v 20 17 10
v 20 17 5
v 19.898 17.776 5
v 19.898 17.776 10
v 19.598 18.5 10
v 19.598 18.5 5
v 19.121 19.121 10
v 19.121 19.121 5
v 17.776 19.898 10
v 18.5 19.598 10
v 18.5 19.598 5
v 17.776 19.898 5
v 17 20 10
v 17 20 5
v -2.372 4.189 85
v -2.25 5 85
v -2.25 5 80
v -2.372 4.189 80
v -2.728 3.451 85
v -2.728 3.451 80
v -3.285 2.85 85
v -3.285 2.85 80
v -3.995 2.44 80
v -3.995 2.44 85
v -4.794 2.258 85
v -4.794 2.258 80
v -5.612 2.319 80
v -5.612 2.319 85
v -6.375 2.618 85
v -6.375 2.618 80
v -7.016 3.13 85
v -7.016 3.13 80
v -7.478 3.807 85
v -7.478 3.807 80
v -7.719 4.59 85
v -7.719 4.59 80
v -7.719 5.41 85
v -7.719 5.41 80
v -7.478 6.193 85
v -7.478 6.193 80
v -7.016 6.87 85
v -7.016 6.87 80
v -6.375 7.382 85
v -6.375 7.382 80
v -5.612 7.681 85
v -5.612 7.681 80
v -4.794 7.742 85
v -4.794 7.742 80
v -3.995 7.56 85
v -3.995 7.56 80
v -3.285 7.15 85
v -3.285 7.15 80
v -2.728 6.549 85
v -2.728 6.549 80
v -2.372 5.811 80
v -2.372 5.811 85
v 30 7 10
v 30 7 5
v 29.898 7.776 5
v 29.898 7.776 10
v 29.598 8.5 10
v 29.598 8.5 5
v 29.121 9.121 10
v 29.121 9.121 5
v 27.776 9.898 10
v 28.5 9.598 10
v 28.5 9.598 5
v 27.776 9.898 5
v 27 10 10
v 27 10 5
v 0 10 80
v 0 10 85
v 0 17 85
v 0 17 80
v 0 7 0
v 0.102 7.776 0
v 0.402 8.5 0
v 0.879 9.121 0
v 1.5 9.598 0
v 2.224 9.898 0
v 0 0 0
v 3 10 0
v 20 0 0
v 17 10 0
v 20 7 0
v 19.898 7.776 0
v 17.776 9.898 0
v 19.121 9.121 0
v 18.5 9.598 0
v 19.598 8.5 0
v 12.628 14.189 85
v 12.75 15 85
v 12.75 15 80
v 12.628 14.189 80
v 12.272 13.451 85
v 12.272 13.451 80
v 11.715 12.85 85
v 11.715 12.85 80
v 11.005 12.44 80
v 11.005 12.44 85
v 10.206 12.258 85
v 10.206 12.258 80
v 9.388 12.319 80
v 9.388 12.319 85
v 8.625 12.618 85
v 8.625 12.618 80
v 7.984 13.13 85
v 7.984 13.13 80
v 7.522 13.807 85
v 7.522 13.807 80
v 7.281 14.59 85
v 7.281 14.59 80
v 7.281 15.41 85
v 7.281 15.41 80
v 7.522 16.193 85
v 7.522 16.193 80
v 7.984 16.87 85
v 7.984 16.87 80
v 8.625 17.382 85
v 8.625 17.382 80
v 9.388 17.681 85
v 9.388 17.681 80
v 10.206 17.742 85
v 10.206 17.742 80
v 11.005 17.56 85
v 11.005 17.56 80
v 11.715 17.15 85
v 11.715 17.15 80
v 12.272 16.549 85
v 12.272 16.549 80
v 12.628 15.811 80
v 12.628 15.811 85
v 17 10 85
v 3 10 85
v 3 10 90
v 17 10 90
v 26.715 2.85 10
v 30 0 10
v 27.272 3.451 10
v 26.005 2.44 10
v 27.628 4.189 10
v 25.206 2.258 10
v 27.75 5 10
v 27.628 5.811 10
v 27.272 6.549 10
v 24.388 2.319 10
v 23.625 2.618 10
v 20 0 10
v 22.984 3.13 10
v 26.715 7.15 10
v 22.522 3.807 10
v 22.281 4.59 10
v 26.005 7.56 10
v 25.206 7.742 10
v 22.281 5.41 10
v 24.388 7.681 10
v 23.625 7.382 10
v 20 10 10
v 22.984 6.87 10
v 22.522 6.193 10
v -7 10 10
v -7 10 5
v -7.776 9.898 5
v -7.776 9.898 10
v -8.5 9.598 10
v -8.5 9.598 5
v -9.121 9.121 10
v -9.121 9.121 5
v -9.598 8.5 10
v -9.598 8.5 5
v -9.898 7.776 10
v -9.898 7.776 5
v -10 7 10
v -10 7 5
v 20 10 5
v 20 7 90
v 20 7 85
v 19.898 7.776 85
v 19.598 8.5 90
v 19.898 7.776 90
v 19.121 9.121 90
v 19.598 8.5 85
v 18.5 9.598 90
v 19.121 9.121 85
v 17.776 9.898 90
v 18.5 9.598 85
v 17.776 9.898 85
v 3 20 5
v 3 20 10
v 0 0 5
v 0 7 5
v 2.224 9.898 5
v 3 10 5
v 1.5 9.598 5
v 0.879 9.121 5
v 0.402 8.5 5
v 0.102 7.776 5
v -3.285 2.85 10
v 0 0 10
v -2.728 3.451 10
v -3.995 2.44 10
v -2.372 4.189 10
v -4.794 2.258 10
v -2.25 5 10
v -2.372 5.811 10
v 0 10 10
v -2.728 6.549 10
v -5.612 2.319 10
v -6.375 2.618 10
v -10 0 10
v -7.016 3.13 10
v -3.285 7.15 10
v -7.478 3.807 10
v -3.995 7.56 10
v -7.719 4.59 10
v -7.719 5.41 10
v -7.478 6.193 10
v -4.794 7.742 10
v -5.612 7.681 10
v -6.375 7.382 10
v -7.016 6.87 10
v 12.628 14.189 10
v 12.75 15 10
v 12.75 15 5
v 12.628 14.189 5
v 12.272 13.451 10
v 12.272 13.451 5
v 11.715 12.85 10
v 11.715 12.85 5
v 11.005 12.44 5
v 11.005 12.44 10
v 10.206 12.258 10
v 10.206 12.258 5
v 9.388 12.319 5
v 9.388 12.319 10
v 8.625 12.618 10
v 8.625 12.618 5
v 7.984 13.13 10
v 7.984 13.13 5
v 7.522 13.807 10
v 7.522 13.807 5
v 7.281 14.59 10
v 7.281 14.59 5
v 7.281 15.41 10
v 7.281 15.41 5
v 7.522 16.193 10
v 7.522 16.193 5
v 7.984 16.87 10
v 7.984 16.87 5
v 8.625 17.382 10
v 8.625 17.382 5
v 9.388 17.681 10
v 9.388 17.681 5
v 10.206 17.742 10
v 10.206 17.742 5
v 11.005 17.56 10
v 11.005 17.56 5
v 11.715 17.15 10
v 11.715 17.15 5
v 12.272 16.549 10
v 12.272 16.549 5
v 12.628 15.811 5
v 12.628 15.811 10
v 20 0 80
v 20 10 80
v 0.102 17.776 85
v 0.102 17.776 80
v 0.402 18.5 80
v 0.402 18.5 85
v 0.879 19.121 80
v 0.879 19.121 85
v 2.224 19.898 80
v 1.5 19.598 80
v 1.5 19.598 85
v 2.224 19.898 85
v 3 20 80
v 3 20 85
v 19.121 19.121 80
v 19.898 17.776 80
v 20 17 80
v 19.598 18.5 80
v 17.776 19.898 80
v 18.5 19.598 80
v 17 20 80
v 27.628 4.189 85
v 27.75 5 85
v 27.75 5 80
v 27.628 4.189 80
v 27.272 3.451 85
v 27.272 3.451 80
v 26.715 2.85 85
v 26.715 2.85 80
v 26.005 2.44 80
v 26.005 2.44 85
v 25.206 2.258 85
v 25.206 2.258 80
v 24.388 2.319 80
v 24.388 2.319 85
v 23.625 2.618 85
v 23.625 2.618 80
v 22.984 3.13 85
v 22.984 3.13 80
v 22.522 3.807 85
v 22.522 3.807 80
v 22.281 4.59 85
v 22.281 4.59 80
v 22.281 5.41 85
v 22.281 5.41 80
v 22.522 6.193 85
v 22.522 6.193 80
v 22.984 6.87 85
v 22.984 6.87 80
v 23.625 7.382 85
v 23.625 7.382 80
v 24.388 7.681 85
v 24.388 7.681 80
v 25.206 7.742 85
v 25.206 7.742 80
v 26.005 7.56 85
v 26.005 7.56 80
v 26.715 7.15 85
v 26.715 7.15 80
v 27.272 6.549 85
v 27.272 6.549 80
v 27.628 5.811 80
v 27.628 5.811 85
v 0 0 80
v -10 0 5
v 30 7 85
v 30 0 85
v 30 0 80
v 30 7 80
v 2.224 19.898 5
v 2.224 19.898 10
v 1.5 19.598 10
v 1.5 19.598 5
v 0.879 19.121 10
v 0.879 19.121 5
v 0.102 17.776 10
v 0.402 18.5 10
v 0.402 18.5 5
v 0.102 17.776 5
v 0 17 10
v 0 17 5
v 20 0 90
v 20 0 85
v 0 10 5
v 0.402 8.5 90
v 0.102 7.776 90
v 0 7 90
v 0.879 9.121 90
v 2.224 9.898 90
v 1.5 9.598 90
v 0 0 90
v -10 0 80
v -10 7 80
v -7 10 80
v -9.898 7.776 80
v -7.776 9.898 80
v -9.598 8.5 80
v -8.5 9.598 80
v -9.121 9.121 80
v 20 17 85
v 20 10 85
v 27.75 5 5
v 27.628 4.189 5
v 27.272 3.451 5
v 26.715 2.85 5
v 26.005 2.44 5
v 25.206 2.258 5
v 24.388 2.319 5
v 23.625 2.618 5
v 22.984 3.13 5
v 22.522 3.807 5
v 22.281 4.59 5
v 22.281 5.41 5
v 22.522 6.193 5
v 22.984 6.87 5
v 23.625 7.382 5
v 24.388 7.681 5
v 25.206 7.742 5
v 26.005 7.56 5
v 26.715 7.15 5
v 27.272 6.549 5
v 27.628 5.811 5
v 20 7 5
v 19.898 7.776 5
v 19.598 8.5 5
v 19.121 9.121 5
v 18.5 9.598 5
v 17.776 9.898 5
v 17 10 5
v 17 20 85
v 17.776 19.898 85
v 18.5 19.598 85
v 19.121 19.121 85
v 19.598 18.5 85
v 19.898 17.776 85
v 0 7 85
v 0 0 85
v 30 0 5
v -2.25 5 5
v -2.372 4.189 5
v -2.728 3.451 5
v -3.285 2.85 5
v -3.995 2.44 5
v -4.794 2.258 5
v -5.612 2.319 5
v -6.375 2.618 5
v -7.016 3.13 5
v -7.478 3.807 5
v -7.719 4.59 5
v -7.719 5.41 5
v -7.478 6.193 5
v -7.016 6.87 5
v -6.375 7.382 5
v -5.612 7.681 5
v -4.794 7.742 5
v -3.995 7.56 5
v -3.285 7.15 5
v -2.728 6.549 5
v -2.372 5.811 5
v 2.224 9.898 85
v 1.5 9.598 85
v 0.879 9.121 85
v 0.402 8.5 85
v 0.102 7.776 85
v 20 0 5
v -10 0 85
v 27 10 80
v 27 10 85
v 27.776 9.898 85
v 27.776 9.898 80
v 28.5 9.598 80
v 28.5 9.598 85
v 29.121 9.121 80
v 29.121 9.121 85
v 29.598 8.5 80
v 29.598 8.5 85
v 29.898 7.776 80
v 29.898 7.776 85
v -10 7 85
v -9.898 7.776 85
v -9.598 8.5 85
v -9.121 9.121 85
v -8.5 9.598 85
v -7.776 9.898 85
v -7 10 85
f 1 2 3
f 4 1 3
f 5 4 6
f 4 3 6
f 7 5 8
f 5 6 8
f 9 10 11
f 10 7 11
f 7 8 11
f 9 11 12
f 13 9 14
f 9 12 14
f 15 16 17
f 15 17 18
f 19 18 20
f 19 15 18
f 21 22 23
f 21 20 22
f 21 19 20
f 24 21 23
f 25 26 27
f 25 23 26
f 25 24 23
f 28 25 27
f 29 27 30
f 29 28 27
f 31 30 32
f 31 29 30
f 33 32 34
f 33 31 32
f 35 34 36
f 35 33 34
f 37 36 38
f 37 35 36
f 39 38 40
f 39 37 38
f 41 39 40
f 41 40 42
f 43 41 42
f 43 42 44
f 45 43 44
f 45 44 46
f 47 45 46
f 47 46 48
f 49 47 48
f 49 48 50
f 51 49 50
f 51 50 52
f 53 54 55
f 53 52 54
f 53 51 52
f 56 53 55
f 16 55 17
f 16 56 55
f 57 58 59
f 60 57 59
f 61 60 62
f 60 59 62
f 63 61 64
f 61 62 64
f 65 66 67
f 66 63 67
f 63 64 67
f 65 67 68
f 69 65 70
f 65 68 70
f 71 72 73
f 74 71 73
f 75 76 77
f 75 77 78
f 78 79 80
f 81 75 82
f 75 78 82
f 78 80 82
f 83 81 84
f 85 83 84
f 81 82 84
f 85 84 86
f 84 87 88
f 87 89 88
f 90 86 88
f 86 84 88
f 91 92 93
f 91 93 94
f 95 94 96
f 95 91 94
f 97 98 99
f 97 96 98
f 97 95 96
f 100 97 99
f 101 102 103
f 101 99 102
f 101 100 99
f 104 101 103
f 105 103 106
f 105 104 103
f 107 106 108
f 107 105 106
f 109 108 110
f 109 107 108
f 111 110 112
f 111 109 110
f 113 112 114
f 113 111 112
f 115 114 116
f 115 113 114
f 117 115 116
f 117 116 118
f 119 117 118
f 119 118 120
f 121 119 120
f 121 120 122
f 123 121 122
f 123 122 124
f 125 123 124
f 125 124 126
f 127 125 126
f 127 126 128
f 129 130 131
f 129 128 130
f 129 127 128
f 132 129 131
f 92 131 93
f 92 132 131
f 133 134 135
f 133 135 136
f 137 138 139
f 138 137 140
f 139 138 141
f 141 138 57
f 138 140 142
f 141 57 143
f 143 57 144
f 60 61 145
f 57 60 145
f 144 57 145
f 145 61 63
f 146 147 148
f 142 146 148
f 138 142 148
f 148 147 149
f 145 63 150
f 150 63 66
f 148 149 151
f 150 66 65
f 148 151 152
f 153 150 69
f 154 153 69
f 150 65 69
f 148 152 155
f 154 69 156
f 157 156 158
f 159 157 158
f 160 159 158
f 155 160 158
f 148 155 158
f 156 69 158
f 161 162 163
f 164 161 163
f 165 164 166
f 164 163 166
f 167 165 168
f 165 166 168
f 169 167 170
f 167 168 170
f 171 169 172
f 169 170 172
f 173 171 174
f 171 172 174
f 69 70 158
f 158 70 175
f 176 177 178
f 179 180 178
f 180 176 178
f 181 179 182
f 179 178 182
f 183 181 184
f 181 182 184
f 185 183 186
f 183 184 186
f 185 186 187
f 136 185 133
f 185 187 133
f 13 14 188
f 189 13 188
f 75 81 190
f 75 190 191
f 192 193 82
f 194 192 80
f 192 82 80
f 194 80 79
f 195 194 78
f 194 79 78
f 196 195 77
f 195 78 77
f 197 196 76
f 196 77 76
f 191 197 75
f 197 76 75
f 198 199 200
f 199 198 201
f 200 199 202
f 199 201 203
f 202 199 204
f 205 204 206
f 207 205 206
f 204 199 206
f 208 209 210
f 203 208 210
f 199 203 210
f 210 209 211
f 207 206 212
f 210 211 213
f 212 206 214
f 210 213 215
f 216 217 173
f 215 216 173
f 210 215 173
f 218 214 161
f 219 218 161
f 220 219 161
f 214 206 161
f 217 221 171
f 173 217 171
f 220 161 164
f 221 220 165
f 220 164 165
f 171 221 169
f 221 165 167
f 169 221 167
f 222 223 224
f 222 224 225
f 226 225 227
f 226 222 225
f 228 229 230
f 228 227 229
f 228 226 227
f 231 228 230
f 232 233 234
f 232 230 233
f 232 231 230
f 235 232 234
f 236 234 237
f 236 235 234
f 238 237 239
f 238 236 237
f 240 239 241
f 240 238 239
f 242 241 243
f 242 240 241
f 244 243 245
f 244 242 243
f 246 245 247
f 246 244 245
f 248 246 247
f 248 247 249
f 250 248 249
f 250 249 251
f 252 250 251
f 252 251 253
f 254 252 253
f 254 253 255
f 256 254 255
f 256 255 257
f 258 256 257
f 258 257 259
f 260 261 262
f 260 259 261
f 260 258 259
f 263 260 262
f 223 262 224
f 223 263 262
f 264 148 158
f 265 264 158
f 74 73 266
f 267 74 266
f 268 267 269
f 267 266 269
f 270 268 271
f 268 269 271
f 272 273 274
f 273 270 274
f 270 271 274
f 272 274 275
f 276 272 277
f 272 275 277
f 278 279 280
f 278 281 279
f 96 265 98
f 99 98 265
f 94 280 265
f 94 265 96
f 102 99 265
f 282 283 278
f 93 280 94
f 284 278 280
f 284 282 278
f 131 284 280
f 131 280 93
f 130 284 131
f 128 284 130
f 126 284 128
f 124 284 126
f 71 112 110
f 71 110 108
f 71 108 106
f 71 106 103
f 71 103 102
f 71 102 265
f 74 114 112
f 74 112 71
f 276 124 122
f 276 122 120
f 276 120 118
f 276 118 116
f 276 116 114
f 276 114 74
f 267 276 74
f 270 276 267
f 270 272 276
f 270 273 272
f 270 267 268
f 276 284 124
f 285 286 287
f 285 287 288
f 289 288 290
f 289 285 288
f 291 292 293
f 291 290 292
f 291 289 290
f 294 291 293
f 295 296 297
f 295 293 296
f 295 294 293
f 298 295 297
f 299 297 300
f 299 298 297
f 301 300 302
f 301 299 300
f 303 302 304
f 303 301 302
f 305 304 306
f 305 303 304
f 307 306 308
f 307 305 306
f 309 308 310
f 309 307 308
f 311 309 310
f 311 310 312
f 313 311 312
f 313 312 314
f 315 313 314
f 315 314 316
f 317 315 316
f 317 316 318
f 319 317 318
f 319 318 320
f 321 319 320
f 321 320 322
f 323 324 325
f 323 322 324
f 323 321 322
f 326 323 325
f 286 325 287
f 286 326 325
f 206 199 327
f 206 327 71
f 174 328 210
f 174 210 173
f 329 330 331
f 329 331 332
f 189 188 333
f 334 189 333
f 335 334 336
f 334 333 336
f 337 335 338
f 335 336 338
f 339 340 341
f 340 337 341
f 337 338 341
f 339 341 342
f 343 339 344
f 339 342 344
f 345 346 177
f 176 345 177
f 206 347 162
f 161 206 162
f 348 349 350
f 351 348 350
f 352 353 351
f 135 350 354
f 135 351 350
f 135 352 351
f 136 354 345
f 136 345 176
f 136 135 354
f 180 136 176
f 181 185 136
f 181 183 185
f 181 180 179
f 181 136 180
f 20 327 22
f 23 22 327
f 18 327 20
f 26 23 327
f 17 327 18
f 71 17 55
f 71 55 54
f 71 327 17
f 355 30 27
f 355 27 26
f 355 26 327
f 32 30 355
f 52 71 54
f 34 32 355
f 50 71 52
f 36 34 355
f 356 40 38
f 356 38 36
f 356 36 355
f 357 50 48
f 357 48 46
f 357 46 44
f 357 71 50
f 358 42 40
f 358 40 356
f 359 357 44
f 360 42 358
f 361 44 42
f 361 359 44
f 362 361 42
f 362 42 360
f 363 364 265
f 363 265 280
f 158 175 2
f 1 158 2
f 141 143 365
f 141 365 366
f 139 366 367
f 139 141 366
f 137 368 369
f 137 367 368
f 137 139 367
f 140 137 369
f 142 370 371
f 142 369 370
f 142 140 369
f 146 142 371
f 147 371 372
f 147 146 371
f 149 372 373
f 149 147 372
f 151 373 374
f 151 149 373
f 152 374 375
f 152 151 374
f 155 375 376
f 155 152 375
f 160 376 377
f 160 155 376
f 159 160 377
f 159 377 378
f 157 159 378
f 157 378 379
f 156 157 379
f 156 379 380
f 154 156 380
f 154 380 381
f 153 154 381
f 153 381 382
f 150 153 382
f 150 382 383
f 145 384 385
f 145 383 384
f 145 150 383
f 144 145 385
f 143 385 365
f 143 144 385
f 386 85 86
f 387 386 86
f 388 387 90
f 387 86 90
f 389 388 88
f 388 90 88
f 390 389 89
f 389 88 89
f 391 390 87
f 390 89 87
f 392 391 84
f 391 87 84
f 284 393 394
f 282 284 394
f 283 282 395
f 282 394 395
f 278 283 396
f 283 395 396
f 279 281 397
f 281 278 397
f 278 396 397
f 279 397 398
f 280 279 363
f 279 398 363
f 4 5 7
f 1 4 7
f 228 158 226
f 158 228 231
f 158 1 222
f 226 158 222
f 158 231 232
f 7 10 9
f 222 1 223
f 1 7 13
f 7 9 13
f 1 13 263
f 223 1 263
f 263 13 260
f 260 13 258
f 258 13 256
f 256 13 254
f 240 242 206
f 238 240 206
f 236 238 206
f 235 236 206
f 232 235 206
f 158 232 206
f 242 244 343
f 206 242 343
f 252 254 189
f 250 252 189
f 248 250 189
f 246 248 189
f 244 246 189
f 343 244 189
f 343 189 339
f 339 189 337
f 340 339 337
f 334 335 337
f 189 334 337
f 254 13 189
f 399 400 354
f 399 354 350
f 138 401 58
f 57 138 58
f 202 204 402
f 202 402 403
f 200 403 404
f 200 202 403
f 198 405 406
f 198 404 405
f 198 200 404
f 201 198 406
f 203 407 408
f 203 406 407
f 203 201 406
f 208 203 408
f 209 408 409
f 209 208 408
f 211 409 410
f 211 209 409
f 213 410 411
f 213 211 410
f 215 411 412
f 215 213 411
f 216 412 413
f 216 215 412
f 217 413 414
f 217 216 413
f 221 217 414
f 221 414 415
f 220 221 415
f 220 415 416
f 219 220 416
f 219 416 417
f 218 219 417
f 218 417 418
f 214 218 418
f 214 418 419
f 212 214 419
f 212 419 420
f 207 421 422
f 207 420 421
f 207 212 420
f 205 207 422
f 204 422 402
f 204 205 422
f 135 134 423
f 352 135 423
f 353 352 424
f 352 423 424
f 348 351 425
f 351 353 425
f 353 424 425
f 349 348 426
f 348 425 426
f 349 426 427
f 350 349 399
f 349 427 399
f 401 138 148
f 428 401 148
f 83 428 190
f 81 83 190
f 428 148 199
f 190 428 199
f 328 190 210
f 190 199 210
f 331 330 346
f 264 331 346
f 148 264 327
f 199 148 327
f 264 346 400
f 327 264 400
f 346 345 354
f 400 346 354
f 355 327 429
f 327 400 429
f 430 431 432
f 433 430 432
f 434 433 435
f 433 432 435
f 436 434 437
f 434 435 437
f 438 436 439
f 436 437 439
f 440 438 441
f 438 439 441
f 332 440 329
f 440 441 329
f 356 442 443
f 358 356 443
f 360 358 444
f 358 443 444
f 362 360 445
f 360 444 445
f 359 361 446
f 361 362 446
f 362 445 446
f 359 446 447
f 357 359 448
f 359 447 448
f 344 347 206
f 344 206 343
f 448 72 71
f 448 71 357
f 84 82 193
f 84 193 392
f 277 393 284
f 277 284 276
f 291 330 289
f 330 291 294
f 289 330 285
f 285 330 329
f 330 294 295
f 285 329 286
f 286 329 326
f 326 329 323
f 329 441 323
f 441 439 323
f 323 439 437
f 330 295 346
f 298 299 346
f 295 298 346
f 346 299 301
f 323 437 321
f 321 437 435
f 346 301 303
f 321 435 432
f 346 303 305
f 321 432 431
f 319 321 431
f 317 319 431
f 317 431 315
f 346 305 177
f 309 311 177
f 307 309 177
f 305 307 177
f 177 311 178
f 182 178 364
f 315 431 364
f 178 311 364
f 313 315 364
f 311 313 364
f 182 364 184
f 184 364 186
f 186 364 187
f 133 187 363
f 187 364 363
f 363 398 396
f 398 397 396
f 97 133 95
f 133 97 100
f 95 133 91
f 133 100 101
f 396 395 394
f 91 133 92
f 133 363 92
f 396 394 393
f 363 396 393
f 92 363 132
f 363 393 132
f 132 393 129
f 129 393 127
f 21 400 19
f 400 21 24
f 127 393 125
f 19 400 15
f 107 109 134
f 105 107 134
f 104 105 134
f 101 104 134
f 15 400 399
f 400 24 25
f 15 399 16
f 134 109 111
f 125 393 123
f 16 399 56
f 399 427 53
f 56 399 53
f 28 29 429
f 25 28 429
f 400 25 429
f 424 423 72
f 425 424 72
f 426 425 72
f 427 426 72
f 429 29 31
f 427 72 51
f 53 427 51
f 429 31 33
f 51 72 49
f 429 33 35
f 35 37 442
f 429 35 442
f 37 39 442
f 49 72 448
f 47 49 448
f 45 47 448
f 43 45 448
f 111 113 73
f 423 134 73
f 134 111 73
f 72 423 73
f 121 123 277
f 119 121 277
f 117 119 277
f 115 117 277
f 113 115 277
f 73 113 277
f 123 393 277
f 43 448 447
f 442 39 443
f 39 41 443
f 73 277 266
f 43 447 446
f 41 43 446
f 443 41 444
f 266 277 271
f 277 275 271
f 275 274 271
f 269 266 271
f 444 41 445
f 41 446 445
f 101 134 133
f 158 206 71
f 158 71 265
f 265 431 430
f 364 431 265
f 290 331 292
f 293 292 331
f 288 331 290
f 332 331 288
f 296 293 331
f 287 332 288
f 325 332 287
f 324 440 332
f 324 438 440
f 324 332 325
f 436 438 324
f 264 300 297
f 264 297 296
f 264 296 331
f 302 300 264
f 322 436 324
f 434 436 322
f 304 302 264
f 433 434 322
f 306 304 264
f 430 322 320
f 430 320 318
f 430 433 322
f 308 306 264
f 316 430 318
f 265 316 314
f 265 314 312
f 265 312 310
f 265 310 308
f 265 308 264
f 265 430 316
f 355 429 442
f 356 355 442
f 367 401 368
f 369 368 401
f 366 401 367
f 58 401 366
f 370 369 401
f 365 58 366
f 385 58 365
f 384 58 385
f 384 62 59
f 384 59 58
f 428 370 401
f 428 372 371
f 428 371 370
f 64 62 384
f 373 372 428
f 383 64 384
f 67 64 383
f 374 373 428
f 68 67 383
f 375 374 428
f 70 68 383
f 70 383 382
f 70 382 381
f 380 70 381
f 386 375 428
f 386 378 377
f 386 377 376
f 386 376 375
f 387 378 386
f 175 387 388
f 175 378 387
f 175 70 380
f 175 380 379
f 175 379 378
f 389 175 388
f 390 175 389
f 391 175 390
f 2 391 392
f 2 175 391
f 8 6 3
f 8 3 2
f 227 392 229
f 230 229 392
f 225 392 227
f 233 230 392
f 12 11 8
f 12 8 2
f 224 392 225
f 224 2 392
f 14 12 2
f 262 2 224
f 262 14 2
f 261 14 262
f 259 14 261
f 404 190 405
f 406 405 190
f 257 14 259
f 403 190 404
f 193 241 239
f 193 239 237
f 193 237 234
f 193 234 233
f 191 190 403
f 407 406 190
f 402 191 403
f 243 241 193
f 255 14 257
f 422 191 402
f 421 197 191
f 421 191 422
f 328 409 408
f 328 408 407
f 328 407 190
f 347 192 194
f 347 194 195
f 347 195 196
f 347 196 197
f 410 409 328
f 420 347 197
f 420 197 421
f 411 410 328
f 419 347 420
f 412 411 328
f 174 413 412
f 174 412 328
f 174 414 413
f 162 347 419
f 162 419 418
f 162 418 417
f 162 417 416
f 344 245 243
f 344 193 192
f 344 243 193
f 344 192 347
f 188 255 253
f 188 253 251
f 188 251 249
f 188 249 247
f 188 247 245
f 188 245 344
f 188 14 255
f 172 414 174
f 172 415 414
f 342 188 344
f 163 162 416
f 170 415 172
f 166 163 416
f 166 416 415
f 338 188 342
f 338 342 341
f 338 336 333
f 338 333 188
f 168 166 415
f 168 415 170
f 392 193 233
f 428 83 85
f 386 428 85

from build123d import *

# Parameters (mm, degrees)
SKETCH_1_W               = 20
SKETCH_1_H               = 10
EXTRUDE_1_DEPTH          = 90
EXTRUDE_START            = -5
SKETCH_2_W               = 10
SKETCH_2_H               = 10
SKETCH_2_W_2             = 20
EXTRUDE_2_DEPTH          = 5
CUT_EXTRUDE_1_DEPTH      = 93.330926563
CUT_EXTRUDE_1_DEPTH_BACK = 93.330926563
SKETCH_3_R               = 2.75
FILLET_1_R               = 3


with BuildPart() as part:
    # 草图1 → 凸台-拉伸1 (new body)
    with BuildSketch(Plane.XY):
        with Locations((10, 5)):
            Rectangle(SKETCH_1_W, SKETCH_1_H)
    extrude(amount=EXTRUDE_1_DEPTH)

    # 草图2 → 凸台-拉伸2 (add)
    with BuildSketch(Plane(origin=(0, 0, 0), x_dir=(-1, 0, 0), z_dir=(0, 0, -1)).offset(EXTRUDE_START)):
        with Locations((-25, 5)):
            Rectangle(SKETCH_2_W, SKETCH_2_H)
        with Locations((-10, 15)):
            Rectangle(SKETCH_2_W_2, SKETCH_2_H)
        with Locations((5, 5)):
            Rectangle(SKETCH_2_W, SKETCH_2_H)
    extrude_2 = extrude(amount=-EXTRUDE_2_DEPTH)

    # 镜向1: 凸台-拉伸2 across plane
    add(extrude_2.mirror(Plane(origin=(0, 0, 45), x_dir=(1, 0, 0), z_dir=(0, 0, -1))))

    # 草图3 → 切除-拉伸1 (cut, two sides: drawn at the far end of the back side and taken through both)
    with BuildSketch(Plane(origin=(0, 0, 5), x_dir=(-1, 0, 0), z_dir=(0, 0, -1)).offset(-CUT_EXTRUDE_1_DEPTH_BACK)):
        with Locations(Location((5, 5, 0), (0, 0, 180))):
            Circle(SKETCH_3_R)
        with Locations(Location((-10, 15, 0), (0, 0, 180))):
            Circle(SKETCH_3_R)
        with Locations(Location((-25, 5, 0), (0, 0, 180))):
            Circle(SKETCH_3_R)
    extrude(amount=CUT_EXTRUDE_1_DEPTH + CUT_EXTRUDE_1_DEPTH_BACK, mode=Mode.SUBTRACT)

    # 圆角1
    # the kernel refuses this fillet: 3 mm, written as the material it takes off along each edge
    with BuildSketch(Plane(origin=(0, 10, -7.5), x_dir=(0, -1, 0), z_dir=(0, 0, 1)), Plane(origin=(0, 10, 85), x_dir=(0, -1, 0), z_dir=(0, 0, 1))) as fillet_1_piece_1:
        with BuildLine():
            CenterArc((FILLET_1_R, FILLET_1_R), FILLET_1_R, 180, 90)
            Line((0, FILLET_1_R), (0, 0))
            Line((0, 0), (FILLET_1_R, 0))
        make_face()
    extrude(amount=12.5, mode=Mode.SUBTRACT)
    with BuildSketch(Plane(origin=(20, 10, -7.5), x_dir=(0, -1, 0), z_dir=(0, 0, 1)), Plane(origin=(20, 10, 85), x_dir=(0, -1, 0), z_dir=(0, 0, 1))) as fillet_1_piece_2:
        with BuildLine():
            CenterArc((FILLET_1_R, -FILLET_1_R), FILLET_1_R, 90, 90)
            Line((0, -FILLET_1_R), (0, 0))
            Line((0, 0), (FILLET_1_R, 0))
        make_face()
    extrude(amount=12.5, mode=Mode.SUBTRACT)
    with BuildSketch(Plane(origin=(20, 20, -2.5), x_dir=(0, -1, 0), z_dir=(0, 0, 1)), Plane(origin=(30, 10, -2.5), x_dir=(0, -1, 0), z_dir=(0, 0, 1)), Plane(origin=(0, 20, 92.5), x_dir=(0, -1, 0), z_dir=(0, 0, -1)), Plane(origin=(-10, 10, 92.5), x_dir=(0, -1, 0), z_dir=(0, 0, -1))) as fillet_1_piece_3:
        with BuildLine():
            CenterArc((FILLET_1_R, -FILLET_1_R), FILLET_1_R, 90, 90)
            Line((0, -FILLET_1_R), (0, 0))
            Line((0, 0), (FILLET_1_R, 0))
        make_face()
    extrude(amount=20, mode=Mode.SUBTRACT)
    with BuildSketch(Plane(origin=(0, 20, -2.5), x_dir=(0, -1, 0), z_dir=(0, 0, 1)), Plane(origin=(-10, 10, -2.5), x_dir=(0, -1, 0), z_dir=(0, 0, 1)), Plane(origin=(30, 10, 92.5), x_dir=(0, -1, 0), z_dir=(0, 0, -1)), Plane(origin=(20, 20, 92.5), x_dir=(0, -1, 0), z_dir=(0, 0, -1))) as fillet_1_piece_4:
        with BuildLine():
            CenterArc((FILLET_1_R, FILLET_1_R), FILLET_1_R, 180, 90)
            Line((0, FILLET_1_R), (0, 0))
            Line((0, 0), (FILLET_1_R, 0))
        make_face()
    extrude(amount=20, mode=Mode.SUBTRACT)


solid = part.part
